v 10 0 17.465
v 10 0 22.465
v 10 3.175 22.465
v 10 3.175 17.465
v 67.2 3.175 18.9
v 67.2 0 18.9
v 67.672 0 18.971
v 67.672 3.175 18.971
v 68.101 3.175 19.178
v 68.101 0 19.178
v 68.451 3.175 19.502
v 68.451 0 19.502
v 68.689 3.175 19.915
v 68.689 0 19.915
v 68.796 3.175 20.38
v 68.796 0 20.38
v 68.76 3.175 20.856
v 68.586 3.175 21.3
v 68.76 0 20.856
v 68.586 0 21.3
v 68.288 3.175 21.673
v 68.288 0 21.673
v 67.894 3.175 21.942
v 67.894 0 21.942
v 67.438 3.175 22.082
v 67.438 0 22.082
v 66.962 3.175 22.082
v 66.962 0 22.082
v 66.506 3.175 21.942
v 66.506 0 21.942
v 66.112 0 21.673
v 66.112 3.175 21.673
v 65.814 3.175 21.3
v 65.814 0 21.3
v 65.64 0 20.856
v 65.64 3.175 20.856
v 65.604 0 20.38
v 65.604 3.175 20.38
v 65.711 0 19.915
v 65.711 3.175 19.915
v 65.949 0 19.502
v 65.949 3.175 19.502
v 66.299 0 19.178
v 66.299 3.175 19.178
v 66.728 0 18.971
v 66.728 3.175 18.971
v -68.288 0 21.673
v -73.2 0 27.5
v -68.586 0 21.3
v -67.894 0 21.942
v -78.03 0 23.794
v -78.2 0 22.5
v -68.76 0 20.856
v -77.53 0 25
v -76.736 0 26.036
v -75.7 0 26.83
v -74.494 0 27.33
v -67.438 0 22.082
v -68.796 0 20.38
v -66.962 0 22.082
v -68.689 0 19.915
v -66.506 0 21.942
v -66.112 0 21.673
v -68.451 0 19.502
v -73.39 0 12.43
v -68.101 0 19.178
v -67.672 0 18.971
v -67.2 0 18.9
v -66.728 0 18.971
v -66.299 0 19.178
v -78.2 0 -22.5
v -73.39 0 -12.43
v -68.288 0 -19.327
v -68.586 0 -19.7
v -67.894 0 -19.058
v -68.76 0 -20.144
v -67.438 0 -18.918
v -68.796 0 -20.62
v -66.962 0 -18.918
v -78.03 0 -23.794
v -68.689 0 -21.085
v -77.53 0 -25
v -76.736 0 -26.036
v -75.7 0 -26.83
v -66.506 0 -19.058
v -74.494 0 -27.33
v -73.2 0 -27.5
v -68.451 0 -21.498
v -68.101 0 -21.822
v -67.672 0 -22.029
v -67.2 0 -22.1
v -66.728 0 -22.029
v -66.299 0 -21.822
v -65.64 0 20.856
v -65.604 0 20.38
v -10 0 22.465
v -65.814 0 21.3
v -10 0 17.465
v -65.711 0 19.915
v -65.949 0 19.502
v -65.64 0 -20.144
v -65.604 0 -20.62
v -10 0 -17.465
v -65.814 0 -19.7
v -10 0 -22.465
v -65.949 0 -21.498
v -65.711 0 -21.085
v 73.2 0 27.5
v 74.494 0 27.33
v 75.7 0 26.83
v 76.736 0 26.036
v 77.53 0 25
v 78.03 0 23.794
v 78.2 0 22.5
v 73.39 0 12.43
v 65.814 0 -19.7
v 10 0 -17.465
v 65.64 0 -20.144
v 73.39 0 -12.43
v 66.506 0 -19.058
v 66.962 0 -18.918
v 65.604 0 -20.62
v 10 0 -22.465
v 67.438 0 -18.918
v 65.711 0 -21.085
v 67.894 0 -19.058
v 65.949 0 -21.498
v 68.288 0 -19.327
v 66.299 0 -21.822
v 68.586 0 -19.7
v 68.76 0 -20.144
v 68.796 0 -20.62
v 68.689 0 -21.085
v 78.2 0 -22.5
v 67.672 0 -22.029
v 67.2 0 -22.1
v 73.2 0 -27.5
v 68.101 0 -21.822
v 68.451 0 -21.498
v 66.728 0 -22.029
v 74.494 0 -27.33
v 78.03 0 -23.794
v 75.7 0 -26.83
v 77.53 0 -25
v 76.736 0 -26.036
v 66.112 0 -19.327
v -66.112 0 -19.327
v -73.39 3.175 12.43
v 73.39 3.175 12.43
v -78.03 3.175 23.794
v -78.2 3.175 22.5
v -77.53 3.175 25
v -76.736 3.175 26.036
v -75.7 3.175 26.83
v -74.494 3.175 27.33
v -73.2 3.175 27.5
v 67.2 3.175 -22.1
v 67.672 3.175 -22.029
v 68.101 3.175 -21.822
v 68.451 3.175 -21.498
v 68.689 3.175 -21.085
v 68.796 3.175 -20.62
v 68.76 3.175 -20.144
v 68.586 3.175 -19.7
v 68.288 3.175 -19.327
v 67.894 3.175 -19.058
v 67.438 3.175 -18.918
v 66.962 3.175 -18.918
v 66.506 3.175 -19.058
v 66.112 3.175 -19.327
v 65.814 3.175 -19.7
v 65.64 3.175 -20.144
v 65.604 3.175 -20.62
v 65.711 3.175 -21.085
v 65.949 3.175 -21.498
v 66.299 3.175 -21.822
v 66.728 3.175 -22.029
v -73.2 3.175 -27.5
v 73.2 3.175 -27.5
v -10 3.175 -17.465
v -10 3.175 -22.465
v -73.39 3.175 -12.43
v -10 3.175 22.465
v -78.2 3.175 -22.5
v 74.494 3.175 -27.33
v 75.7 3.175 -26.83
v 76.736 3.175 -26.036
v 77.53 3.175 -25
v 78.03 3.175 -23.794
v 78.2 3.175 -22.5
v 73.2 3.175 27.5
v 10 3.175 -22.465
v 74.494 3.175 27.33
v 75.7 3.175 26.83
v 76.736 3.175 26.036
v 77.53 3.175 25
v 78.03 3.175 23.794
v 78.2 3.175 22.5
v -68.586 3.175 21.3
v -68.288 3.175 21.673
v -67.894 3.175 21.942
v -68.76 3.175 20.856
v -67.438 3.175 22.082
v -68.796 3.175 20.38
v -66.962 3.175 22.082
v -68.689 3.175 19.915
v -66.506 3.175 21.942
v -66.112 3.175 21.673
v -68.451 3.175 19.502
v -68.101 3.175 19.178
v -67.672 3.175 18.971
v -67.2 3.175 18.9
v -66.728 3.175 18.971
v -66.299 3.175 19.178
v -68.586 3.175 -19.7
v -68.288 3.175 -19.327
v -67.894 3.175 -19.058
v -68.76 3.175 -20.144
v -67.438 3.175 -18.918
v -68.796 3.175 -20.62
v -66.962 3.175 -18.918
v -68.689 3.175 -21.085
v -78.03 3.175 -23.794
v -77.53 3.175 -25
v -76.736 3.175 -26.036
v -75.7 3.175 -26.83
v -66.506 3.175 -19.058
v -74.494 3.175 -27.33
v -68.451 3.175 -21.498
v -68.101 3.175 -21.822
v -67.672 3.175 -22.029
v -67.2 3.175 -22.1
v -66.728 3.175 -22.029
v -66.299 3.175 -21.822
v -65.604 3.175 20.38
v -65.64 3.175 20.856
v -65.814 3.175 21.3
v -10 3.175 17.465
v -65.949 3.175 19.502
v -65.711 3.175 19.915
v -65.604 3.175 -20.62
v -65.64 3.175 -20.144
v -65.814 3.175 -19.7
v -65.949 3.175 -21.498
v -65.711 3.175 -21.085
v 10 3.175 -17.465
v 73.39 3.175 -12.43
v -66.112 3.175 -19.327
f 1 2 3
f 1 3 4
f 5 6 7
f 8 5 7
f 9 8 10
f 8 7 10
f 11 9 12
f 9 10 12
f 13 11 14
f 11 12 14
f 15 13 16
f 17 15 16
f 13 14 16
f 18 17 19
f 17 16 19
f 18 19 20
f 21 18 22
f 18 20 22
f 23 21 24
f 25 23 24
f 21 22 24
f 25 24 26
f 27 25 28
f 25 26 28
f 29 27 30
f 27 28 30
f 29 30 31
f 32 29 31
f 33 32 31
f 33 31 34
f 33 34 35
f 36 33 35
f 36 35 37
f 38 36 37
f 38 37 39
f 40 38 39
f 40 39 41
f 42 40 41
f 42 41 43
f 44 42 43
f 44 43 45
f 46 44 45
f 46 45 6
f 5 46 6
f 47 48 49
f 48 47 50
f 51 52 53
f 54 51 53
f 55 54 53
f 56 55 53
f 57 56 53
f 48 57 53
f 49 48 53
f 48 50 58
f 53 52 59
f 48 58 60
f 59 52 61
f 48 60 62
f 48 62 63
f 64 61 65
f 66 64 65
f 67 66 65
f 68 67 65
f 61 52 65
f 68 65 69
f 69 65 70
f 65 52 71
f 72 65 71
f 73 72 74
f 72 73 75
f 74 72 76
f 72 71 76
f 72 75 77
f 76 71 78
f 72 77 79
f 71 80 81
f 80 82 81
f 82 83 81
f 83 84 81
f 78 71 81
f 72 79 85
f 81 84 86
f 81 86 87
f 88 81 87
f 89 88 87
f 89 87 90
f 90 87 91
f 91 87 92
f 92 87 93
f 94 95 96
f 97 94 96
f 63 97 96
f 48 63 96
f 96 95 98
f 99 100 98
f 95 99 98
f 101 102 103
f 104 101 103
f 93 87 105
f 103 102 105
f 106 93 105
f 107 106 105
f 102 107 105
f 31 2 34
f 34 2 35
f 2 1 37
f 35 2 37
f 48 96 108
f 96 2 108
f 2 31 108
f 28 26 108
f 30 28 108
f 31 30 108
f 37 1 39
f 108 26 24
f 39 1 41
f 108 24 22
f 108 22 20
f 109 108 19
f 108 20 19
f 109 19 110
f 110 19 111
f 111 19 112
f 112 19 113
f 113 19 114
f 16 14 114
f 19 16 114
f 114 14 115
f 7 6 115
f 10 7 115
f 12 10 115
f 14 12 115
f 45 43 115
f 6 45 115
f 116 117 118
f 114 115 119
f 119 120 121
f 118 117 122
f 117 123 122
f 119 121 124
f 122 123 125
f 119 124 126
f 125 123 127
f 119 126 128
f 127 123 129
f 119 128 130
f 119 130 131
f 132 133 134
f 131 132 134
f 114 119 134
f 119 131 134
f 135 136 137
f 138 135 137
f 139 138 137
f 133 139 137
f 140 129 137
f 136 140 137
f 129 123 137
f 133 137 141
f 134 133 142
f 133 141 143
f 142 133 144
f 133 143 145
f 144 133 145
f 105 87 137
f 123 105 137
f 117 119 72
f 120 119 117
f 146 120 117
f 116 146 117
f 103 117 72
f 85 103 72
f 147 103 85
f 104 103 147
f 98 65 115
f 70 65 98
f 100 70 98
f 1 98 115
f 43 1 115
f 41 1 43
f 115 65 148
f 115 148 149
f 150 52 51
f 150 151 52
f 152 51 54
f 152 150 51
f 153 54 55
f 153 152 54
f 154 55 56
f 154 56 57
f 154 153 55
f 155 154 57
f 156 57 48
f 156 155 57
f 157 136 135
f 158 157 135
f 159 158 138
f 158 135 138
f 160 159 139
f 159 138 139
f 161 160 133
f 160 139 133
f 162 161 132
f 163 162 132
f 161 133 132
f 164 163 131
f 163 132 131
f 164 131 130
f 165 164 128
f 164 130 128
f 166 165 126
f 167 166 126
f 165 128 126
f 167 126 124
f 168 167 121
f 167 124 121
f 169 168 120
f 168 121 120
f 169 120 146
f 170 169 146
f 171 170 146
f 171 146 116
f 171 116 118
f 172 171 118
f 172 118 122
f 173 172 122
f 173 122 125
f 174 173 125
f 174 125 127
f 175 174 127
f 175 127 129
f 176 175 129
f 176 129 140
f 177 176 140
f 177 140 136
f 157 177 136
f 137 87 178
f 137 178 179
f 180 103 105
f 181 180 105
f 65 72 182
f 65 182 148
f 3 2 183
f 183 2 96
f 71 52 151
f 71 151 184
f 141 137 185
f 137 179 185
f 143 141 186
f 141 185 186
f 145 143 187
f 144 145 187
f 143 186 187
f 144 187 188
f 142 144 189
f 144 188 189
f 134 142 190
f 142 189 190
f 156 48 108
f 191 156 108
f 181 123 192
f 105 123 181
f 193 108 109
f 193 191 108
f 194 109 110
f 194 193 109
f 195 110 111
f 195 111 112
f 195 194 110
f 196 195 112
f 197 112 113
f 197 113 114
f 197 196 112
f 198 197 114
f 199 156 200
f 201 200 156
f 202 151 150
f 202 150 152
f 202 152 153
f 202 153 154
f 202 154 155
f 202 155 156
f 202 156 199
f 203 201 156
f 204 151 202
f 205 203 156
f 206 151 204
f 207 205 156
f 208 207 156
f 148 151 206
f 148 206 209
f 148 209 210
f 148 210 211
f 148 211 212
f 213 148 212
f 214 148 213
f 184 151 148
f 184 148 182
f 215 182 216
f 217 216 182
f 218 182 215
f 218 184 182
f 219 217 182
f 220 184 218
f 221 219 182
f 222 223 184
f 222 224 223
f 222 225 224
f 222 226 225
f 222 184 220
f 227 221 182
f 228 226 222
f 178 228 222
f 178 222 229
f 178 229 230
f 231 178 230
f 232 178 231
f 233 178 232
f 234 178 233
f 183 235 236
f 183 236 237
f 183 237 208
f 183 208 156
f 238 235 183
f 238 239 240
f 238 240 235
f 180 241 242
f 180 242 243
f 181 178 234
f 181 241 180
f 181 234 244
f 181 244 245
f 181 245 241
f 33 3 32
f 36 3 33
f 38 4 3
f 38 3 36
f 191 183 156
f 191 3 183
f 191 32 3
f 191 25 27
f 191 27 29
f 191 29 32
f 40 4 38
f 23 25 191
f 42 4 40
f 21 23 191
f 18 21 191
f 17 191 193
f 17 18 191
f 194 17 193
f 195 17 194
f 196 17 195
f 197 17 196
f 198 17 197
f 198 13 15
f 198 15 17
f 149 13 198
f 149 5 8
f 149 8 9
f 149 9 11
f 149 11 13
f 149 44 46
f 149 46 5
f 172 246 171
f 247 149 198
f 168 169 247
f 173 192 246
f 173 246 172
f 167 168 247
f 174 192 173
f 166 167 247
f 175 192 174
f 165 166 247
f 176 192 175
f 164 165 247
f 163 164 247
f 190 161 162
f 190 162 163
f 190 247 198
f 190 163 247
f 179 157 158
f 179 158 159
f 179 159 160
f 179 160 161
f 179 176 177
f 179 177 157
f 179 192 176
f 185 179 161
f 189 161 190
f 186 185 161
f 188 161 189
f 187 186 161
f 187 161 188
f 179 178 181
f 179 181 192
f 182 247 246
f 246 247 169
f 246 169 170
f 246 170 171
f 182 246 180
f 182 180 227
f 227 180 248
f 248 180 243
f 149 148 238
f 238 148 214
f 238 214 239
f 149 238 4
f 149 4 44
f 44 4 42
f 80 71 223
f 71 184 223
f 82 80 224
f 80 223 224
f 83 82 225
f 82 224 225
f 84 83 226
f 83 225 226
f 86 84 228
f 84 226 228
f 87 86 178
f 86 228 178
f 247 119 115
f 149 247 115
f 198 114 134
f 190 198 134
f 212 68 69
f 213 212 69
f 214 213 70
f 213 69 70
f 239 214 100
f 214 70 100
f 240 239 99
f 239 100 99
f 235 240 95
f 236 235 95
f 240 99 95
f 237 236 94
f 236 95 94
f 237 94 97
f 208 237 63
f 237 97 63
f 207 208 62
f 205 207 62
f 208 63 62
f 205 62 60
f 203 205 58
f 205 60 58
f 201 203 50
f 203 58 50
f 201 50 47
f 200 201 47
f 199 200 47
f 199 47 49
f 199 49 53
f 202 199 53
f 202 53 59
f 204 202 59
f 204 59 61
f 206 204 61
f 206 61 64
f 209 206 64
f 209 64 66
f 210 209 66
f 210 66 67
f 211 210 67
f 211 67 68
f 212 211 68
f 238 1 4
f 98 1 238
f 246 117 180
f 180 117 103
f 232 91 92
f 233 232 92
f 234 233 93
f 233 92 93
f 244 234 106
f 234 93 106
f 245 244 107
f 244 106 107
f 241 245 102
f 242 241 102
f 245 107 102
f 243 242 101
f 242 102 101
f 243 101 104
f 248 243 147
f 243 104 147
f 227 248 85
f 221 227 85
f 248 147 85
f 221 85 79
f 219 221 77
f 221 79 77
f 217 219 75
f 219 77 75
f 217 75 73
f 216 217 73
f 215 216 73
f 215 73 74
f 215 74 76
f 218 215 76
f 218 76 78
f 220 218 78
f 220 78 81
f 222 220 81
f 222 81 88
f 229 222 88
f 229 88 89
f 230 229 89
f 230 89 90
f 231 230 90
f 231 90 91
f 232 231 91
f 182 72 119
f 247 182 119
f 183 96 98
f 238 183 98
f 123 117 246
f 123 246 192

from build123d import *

# Parameters (mm, degrees)
SKETCH1_W           = 156.4
SKETCH1_H           = 55
BOSS_EXTRUDE1_DEPTH = 3.175
SKETCH2_R           = 1.6
CUT_EXTRUDE1_DEPTH  = 83.955232656
SKETCH5_W           = 146.78
SKETCH5_H           = 24.86
CUT_EXTRUDE4_DEPTH  = 3.175
SKETCH6_W           = 20
SKETCH6_H           = 5
CUT_EXTRUDE5_DEPTH  = 83.955232656
FILLET1_R           = 5


with BuildPart() as part:
    # Sketch1 → Boss-Extrude1 (new body)
    with BuildSketch(Plane(origin=(0, 0, 0), x_dir=(1, 0, 0), z_dir=(0, 1, 0))):
        Rectangle(SKETCH1_W, SKETCH1_H)
    extrude(amount=BOSS_EXTRUDE1_DEPTH)

    # Sketch2 → Cut-Extrude1 (cut, through all)
    with BuildSketch(Plane.XZ):
        with Locations(Location((67.2, 20.5, 0), (0, 0, 270))):
            Circle(SKETCH2_R)
        with Locations(Location((67.2, -20.5, 0), (0, 0, 270))):
            Circle(SKETCH2_R)
        with Locations(Location((-67.2, -20.5, 0), (0, 0, 270))):
            Circle(SKETCH2_R)
        with Locations(Location((-67.2, 20.5, 0), (0, 0, 270))):
            Circle(SKETCH2_R)
    extrude(amount=-CUT_EXTRUDE1_DEPTH, mode=Mode.SUBTRACT)

    # Sketch5 → Cut-Extrude4 (cut)
    with BuildSketch(Plane.XZ):
        Rectangle(SKETCH5_W, SKETCH5_H)
    extrude(amount=-CUT_EXTRUDE4_DEPTH, mode=Mode.SUBTRACT)

    # Sketch6 → Cut-Extrude5 (cut, through all)
    with BuildSketch(Plane(origin=(0, 0, 0), x_dir=(-1, 0, 0), z_dir=(0, -1, 0))):
        with Locations((0, -19.965)):
            Rectangle(SKETCH6_W, SKETCH6_H)
        with Locations((0, 19.965)):
            Rectangle(SKETCH6_W, SKETCH6_H)
    extrude(amount=-CUT_EXTRUDE5_DEPTH, mode=Mode.SUBTRACT)

    # Fillet1
    fillet1_edges = [part.edges().sort_by_distance(p)[0] for p in [
        (78.2, 1.5875, 27.5),
        (-78.2, 1.5875, 27.5),
        (-78.2, 1.5875, -27.5),
        (78.2, 1.5875, -27.5),
    ]]
    fillet(fillet1_edges, radius=FILLET1_R)


solid = part.part
